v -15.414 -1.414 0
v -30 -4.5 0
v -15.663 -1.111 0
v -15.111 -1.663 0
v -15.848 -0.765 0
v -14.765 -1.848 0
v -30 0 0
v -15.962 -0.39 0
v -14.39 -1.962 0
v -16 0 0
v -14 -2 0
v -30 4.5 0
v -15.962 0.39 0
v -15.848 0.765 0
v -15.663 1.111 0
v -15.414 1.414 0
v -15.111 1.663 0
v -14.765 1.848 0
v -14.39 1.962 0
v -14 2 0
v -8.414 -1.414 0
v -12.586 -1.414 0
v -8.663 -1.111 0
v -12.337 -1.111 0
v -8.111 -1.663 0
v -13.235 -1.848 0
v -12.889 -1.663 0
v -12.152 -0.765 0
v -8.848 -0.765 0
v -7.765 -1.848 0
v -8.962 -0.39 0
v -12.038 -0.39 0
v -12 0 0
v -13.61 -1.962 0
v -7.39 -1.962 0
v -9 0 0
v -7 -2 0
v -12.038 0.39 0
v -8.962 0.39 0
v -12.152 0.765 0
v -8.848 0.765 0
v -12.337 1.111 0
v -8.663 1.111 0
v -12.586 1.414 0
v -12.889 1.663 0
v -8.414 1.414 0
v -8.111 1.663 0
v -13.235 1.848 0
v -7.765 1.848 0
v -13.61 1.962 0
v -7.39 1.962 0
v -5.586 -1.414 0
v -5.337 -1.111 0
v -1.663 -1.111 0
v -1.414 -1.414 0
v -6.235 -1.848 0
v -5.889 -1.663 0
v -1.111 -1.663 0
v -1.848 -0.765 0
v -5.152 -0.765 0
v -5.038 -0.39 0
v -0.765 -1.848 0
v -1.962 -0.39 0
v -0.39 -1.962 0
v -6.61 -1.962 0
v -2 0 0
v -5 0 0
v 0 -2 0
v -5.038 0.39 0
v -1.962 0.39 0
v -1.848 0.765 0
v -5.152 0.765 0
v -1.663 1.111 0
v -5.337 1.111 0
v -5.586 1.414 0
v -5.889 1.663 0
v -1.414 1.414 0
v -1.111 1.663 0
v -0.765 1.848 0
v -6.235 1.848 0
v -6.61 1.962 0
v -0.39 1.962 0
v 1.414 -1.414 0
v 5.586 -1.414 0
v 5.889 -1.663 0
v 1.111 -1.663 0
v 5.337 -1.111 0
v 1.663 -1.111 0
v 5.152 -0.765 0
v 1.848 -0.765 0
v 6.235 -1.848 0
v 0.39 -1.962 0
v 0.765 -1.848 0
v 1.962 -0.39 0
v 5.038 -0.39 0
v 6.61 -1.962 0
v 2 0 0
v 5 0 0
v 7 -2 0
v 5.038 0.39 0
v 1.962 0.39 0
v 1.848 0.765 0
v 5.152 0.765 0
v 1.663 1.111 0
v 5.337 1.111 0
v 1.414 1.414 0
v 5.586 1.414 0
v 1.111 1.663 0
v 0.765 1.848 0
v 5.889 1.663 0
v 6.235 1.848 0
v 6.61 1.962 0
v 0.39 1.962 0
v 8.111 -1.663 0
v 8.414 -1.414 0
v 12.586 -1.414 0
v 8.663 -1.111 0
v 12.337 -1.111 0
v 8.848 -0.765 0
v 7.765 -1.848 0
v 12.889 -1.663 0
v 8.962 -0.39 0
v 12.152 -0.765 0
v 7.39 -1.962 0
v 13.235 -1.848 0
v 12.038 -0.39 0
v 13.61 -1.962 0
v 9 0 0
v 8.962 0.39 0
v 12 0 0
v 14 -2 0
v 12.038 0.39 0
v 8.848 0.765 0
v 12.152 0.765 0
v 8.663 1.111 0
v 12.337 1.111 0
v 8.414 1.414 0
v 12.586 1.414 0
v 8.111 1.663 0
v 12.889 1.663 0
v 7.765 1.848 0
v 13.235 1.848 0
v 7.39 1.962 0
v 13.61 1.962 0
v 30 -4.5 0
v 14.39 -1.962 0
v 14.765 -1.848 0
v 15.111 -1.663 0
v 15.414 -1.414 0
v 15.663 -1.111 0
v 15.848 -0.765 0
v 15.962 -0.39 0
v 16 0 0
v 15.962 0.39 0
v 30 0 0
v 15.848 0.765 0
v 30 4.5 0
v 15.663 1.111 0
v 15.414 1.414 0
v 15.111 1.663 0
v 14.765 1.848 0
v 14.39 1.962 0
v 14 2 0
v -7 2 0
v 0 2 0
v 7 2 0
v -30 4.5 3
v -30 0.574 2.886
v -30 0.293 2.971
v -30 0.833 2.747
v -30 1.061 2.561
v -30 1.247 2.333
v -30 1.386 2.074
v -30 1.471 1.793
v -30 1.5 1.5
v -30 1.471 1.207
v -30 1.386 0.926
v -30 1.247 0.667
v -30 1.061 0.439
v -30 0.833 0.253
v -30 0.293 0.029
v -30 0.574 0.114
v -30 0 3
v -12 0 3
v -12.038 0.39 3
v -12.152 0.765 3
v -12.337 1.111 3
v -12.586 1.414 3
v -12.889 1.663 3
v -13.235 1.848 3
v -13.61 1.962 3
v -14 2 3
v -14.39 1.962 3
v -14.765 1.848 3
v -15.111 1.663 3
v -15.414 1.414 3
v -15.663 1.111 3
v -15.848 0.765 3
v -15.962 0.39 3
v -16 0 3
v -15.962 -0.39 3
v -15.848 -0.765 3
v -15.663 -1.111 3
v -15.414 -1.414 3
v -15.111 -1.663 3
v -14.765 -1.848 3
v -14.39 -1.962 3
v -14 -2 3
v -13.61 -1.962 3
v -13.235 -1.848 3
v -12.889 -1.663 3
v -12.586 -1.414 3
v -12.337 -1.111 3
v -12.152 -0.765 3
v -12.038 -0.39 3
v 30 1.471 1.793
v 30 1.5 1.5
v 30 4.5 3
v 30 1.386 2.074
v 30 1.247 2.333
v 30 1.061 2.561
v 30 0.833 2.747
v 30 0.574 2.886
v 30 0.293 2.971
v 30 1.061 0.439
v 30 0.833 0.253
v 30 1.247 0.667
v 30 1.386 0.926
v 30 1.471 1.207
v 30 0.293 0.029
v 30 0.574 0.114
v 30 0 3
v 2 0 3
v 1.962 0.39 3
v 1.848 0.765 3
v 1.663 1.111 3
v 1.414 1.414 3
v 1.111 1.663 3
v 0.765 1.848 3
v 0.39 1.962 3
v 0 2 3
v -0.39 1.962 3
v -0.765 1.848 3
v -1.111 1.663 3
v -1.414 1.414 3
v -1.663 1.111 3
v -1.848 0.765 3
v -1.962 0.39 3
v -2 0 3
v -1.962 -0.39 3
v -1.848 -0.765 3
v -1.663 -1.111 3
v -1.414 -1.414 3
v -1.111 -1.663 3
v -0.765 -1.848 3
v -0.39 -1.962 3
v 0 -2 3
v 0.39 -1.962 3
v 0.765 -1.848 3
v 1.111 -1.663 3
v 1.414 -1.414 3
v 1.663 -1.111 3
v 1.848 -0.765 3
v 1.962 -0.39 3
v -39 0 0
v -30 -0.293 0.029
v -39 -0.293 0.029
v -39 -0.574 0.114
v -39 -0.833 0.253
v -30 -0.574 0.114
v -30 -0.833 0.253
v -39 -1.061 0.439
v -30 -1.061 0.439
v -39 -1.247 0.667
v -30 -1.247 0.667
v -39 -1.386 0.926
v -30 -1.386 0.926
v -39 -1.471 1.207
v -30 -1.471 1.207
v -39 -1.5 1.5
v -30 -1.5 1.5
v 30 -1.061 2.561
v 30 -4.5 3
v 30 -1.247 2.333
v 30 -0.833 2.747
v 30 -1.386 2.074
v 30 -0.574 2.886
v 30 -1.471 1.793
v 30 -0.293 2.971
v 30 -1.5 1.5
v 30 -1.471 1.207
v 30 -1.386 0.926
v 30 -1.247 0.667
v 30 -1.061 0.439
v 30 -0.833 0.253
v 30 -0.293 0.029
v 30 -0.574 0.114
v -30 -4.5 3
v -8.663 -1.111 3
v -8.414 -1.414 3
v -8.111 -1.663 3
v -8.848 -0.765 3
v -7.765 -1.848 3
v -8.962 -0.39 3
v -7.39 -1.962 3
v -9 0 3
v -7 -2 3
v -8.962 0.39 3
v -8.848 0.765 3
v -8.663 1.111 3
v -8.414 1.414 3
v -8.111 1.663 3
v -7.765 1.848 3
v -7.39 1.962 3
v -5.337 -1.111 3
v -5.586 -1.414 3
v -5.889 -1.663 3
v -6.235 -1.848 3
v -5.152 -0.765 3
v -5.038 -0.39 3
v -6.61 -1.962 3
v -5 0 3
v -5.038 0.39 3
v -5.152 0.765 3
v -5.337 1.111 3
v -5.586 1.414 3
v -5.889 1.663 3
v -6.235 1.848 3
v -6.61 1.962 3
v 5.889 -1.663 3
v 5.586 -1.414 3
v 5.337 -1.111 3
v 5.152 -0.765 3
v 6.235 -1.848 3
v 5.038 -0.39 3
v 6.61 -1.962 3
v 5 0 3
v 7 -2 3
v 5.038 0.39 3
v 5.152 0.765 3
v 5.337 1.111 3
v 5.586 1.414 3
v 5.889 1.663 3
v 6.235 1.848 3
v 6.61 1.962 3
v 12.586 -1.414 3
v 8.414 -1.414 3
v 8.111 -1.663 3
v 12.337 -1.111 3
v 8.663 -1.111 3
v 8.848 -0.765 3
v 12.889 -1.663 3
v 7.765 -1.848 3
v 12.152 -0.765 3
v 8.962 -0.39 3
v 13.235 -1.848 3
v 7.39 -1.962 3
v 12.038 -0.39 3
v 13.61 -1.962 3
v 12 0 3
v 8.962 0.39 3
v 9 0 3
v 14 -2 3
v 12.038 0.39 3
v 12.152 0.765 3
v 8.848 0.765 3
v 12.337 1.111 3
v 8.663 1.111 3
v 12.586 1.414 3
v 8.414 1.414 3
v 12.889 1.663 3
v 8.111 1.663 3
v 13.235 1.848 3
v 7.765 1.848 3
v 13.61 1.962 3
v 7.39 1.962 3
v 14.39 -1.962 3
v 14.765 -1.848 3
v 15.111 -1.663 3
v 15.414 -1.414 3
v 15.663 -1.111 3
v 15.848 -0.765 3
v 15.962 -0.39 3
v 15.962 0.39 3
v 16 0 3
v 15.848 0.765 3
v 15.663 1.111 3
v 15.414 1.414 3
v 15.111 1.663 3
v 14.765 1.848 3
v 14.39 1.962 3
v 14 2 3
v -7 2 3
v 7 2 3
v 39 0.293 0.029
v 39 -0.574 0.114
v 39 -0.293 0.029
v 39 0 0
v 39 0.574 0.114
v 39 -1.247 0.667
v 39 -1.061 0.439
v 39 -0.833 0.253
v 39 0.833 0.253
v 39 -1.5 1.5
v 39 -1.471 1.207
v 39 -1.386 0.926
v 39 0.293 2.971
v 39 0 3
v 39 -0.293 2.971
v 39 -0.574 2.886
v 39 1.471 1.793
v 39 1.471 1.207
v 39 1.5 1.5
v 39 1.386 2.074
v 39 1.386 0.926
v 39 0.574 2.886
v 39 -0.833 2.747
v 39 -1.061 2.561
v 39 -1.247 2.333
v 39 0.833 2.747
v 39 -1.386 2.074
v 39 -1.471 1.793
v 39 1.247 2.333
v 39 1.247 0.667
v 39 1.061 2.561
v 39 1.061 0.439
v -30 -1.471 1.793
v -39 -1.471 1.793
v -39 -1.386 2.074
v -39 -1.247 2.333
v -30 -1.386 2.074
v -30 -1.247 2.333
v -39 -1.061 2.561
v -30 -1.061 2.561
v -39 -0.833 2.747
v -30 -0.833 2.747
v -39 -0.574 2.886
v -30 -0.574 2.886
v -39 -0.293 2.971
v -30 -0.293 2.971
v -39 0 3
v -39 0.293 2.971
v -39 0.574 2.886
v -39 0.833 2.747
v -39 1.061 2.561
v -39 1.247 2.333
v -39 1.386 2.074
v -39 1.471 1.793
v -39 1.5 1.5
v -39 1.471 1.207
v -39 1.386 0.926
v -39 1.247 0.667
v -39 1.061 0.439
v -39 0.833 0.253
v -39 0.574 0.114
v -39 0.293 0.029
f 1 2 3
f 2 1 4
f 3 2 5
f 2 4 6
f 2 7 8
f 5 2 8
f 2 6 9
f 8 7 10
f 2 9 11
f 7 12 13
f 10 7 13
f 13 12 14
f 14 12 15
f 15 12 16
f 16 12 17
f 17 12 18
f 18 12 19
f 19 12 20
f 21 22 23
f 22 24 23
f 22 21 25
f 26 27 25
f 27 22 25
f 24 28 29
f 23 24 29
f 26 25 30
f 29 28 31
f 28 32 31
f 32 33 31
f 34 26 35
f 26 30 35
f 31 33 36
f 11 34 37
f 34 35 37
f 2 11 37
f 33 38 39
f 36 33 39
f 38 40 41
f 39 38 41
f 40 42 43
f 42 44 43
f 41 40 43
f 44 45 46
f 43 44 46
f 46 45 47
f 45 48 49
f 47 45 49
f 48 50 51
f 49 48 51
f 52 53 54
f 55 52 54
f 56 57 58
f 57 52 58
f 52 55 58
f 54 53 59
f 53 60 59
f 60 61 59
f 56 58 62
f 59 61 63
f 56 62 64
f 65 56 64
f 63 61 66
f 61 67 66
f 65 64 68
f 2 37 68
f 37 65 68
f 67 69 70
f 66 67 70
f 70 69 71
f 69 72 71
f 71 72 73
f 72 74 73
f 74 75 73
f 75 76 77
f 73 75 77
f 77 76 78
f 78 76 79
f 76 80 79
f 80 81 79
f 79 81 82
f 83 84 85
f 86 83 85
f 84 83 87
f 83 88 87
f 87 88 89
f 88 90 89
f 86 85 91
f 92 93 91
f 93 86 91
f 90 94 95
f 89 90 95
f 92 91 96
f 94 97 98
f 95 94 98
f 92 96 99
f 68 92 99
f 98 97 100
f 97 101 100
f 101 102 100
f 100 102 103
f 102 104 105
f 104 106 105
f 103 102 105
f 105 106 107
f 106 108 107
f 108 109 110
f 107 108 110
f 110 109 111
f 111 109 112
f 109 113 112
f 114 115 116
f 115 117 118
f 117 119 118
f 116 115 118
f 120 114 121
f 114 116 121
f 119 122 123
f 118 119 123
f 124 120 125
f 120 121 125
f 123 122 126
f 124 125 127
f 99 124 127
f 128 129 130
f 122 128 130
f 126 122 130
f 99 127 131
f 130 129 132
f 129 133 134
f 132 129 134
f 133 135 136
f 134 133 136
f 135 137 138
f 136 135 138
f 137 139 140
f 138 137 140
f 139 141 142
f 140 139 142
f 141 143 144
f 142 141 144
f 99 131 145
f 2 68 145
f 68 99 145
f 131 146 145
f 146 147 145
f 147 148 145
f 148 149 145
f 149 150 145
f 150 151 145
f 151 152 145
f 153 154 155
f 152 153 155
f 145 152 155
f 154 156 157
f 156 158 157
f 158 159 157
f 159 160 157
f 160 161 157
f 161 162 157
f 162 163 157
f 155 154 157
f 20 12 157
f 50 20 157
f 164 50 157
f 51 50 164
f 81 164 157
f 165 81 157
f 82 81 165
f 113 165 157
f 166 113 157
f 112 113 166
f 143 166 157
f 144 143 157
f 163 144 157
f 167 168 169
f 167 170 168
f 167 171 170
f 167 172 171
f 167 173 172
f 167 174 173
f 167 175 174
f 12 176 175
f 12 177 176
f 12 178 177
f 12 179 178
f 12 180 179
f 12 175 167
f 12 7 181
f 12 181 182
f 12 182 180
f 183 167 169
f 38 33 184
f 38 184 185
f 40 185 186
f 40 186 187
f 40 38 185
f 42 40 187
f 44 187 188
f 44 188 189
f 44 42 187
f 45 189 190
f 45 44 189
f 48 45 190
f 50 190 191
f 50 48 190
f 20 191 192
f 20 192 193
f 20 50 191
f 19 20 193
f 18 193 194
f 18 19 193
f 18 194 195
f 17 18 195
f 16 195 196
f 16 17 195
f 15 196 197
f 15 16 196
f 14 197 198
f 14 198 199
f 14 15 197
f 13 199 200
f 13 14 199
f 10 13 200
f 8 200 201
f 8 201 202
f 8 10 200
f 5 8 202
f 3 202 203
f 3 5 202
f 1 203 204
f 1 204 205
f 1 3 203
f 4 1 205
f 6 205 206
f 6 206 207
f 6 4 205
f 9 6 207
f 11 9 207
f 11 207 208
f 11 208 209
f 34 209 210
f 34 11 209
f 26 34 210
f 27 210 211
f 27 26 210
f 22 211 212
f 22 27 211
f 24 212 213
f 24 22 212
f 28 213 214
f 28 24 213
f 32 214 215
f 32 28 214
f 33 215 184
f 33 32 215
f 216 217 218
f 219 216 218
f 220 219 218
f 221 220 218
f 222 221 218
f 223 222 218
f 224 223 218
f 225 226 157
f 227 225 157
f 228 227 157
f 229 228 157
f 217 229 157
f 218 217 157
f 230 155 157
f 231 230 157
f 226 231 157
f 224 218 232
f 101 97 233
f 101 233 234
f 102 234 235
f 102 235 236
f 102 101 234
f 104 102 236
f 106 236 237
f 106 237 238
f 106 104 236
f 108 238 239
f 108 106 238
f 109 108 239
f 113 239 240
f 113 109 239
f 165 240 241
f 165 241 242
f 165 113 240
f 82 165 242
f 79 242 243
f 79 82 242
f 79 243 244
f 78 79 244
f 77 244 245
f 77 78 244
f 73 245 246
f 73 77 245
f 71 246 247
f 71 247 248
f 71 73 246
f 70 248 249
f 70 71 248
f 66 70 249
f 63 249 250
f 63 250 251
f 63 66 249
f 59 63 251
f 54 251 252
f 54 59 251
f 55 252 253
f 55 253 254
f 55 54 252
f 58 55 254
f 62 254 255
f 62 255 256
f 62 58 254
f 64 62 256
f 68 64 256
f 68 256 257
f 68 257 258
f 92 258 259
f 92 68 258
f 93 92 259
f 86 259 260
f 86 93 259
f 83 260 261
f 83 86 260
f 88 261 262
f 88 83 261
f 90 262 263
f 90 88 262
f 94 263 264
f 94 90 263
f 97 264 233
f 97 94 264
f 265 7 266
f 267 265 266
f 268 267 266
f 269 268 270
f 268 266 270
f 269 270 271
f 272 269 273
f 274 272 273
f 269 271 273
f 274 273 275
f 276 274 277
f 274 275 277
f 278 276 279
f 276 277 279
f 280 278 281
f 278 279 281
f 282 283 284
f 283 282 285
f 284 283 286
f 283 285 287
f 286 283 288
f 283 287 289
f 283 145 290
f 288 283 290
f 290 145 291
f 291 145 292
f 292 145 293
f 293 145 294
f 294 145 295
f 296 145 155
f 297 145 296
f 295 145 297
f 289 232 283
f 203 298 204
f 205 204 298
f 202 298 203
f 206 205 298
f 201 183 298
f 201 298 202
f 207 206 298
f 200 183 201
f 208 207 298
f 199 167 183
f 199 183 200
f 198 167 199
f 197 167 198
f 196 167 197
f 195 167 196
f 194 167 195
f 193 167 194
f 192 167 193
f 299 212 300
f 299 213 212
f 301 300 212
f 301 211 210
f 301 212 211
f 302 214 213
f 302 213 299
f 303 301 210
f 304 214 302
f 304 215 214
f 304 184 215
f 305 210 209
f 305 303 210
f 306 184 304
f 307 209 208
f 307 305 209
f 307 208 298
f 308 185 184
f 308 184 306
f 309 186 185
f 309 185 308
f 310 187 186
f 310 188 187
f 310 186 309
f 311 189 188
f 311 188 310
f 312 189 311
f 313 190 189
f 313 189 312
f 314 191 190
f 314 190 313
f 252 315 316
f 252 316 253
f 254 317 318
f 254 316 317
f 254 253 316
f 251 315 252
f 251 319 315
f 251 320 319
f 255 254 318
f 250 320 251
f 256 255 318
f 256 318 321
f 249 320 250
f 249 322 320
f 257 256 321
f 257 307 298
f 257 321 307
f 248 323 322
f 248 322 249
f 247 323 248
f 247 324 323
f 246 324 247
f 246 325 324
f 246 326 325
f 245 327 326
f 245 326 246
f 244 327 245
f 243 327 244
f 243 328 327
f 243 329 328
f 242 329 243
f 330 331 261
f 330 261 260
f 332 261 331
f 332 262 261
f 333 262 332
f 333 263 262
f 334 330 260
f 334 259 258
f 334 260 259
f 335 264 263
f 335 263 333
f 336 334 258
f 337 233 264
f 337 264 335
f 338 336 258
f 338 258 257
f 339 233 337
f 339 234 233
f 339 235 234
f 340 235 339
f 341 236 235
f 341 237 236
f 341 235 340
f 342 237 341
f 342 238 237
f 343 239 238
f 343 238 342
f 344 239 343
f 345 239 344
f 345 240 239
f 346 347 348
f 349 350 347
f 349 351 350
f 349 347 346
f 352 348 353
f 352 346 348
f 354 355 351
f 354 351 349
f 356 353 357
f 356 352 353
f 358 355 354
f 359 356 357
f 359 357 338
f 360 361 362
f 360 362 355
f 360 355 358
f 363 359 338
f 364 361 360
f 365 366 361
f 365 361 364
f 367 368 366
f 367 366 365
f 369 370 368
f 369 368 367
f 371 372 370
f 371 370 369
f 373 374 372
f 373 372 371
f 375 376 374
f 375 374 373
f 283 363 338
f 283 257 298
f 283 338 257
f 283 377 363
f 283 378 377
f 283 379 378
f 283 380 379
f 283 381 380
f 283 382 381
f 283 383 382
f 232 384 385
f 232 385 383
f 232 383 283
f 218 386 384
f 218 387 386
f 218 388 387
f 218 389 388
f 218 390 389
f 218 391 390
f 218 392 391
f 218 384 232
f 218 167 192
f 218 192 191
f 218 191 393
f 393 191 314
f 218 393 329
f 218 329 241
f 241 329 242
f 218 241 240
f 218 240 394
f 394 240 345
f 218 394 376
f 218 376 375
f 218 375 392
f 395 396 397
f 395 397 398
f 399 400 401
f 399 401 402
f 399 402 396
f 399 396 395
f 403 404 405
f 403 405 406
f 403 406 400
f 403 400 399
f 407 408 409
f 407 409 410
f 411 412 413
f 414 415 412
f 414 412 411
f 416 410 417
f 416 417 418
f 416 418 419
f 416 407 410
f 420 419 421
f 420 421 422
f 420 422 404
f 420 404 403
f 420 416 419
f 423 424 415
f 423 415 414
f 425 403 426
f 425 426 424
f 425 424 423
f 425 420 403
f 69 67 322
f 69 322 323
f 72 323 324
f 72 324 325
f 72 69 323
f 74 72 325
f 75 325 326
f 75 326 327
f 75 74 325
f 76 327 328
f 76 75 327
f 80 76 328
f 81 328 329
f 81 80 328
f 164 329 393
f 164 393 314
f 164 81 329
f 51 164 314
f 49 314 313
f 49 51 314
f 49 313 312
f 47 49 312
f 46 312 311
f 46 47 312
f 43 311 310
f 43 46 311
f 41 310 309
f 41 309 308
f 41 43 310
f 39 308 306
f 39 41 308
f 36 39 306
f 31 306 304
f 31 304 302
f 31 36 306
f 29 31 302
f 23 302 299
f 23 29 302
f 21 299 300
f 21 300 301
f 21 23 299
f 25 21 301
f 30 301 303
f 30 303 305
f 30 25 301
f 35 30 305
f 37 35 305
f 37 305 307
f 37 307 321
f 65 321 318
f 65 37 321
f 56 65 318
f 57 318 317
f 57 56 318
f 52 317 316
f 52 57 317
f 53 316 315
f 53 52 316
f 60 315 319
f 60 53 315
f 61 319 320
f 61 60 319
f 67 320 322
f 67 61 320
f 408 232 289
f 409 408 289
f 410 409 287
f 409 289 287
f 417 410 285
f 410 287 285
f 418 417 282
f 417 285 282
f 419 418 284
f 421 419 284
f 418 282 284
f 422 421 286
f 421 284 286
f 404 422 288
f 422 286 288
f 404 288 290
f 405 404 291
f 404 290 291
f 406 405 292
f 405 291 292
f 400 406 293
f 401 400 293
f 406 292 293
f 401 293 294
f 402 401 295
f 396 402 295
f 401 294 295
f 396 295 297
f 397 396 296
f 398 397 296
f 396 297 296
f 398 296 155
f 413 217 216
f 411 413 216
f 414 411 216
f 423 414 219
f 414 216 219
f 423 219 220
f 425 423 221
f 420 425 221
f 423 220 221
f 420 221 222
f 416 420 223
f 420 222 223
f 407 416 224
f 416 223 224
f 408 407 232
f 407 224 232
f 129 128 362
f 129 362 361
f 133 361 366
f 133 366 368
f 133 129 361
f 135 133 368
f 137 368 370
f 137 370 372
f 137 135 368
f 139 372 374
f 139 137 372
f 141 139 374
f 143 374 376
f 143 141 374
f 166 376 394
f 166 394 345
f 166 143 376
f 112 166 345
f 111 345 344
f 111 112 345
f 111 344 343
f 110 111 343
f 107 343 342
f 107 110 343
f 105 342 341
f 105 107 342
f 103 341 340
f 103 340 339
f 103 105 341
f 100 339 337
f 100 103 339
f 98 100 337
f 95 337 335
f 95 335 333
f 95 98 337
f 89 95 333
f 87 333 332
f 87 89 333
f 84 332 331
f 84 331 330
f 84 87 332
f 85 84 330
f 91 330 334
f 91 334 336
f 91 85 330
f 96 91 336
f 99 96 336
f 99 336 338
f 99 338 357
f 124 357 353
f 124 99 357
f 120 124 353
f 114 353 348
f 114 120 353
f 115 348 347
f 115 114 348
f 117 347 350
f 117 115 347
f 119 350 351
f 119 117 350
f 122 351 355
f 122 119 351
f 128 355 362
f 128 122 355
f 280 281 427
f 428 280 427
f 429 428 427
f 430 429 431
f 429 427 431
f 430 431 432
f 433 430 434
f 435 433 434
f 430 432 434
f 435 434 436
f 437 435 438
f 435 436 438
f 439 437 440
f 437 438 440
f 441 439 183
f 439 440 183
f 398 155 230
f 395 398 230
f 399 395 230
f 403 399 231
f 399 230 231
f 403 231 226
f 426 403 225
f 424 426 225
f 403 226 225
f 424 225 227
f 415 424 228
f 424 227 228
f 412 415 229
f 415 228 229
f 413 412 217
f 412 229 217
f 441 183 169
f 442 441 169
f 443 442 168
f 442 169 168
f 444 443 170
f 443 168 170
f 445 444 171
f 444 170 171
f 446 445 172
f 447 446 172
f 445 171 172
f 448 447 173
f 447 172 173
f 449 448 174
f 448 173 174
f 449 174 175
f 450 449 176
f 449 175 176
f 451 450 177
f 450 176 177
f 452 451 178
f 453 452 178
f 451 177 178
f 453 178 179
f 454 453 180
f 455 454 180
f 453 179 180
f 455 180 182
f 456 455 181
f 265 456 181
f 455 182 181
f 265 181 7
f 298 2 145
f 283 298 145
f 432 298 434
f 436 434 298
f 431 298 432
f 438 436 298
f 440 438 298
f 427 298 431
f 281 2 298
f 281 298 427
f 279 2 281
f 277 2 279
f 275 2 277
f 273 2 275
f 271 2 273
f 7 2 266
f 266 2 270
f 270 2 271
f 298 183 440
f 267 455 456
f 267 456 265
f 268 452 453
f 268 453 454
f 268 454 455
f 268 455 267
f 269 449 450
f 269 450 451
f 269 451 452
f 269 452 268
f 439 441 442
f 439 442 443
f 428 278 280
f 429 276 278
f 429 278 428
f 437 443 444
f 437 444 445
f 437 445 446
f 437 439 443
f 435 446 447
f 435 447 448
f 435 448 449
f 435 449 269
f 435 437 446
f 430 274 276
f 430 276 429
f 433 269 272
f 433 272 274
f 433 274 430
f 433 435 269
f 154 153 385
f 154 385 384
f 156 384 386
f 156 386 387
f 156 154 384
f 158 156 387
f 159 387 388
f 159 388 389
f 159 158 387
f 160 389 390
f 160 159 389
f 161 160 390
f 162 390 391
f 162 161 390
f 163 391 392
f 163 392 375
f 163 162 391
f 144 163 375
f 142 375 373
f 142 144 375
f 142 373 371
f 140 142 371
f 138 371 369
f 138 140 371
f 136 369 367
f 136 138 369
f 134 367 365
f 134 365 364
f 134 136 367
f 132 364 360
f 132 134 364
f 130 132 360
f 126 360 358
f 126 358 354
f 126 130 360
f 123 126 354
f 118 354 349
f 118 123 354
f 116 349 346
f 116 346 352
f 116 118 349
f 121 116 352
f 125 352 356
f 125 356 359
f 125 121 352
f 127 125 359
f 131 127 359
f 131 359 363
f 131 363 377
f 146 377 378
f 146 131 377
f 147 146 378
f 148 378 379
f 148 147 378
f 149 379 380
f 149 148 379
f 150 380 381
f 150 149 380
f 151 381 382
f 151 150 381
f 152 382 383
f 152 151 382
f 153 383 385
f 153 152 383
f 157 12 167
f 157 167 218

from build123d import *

# Parameters (mm, degrees)
F0_W     = 60
F0_H     = 9
F0_R     = 2
F1_DEPTH = 3
F3_DEPTH = 9
F5_DEPTH = 9


with BuildPart() as f1:
    # F0 (on Top) → F1 (new body)
    with BuildSketch(Plane.XY):
        Rectangle(F0_W, F0_H)
        with Locations((-14, 0)):
            Circle(F0_R, mode=Mode.SUBTRACT)
        with Locations((-7, 0)):
            Circle(F0_R, mode=Mode.SUBTRACT)
        Circle(F0_R, mode=Mode.SUBTRACT)
        with Locations((7, 0)):
            Circle(F0_R, mode=Mode.SUBTRACT)
        with Locations((14, 0)):
            Circle(F0_R, mode=Mode.SUBTRACT)
    extrude(amount=F1_DEPTH)

    # F2 (on face) → F3 (join)
    with BuildSketch(Plane(origin=(-30, 0, 0), x_dir=(0, -1, 0), z_dir=(-1, 0, 0))):
        with BuildLine():
            ThreePointArc((0, 0), (1.06066, 0.43934), (1.5, 1.5))
            ThreePointArc((1.5, 1.5), (1.06066, 2.56066), (0, 3))
            ThreePointArc((0, 3), (-1.5, 1.5), (0, 0))
        make_face()
    extrude(amount=F3_DEPTH)

    # F4 (on face) → F5 (join)
    with BuildSketch(Plane.YZ.offset(30)):
        with BuildLine():
            ThreePointArc((0, 0), (1.06066, 0.43934), (1.5, 1.5))
            ThreePointArc((1.5, 1.5), (1.06066, 2.56066), (0, 3))
            ThreePointArc((0, 3), (-1.5, 1.5), (0, 0))
        make_face()
    extrude(amount=F5_DEPTH)


solid = f1.part
